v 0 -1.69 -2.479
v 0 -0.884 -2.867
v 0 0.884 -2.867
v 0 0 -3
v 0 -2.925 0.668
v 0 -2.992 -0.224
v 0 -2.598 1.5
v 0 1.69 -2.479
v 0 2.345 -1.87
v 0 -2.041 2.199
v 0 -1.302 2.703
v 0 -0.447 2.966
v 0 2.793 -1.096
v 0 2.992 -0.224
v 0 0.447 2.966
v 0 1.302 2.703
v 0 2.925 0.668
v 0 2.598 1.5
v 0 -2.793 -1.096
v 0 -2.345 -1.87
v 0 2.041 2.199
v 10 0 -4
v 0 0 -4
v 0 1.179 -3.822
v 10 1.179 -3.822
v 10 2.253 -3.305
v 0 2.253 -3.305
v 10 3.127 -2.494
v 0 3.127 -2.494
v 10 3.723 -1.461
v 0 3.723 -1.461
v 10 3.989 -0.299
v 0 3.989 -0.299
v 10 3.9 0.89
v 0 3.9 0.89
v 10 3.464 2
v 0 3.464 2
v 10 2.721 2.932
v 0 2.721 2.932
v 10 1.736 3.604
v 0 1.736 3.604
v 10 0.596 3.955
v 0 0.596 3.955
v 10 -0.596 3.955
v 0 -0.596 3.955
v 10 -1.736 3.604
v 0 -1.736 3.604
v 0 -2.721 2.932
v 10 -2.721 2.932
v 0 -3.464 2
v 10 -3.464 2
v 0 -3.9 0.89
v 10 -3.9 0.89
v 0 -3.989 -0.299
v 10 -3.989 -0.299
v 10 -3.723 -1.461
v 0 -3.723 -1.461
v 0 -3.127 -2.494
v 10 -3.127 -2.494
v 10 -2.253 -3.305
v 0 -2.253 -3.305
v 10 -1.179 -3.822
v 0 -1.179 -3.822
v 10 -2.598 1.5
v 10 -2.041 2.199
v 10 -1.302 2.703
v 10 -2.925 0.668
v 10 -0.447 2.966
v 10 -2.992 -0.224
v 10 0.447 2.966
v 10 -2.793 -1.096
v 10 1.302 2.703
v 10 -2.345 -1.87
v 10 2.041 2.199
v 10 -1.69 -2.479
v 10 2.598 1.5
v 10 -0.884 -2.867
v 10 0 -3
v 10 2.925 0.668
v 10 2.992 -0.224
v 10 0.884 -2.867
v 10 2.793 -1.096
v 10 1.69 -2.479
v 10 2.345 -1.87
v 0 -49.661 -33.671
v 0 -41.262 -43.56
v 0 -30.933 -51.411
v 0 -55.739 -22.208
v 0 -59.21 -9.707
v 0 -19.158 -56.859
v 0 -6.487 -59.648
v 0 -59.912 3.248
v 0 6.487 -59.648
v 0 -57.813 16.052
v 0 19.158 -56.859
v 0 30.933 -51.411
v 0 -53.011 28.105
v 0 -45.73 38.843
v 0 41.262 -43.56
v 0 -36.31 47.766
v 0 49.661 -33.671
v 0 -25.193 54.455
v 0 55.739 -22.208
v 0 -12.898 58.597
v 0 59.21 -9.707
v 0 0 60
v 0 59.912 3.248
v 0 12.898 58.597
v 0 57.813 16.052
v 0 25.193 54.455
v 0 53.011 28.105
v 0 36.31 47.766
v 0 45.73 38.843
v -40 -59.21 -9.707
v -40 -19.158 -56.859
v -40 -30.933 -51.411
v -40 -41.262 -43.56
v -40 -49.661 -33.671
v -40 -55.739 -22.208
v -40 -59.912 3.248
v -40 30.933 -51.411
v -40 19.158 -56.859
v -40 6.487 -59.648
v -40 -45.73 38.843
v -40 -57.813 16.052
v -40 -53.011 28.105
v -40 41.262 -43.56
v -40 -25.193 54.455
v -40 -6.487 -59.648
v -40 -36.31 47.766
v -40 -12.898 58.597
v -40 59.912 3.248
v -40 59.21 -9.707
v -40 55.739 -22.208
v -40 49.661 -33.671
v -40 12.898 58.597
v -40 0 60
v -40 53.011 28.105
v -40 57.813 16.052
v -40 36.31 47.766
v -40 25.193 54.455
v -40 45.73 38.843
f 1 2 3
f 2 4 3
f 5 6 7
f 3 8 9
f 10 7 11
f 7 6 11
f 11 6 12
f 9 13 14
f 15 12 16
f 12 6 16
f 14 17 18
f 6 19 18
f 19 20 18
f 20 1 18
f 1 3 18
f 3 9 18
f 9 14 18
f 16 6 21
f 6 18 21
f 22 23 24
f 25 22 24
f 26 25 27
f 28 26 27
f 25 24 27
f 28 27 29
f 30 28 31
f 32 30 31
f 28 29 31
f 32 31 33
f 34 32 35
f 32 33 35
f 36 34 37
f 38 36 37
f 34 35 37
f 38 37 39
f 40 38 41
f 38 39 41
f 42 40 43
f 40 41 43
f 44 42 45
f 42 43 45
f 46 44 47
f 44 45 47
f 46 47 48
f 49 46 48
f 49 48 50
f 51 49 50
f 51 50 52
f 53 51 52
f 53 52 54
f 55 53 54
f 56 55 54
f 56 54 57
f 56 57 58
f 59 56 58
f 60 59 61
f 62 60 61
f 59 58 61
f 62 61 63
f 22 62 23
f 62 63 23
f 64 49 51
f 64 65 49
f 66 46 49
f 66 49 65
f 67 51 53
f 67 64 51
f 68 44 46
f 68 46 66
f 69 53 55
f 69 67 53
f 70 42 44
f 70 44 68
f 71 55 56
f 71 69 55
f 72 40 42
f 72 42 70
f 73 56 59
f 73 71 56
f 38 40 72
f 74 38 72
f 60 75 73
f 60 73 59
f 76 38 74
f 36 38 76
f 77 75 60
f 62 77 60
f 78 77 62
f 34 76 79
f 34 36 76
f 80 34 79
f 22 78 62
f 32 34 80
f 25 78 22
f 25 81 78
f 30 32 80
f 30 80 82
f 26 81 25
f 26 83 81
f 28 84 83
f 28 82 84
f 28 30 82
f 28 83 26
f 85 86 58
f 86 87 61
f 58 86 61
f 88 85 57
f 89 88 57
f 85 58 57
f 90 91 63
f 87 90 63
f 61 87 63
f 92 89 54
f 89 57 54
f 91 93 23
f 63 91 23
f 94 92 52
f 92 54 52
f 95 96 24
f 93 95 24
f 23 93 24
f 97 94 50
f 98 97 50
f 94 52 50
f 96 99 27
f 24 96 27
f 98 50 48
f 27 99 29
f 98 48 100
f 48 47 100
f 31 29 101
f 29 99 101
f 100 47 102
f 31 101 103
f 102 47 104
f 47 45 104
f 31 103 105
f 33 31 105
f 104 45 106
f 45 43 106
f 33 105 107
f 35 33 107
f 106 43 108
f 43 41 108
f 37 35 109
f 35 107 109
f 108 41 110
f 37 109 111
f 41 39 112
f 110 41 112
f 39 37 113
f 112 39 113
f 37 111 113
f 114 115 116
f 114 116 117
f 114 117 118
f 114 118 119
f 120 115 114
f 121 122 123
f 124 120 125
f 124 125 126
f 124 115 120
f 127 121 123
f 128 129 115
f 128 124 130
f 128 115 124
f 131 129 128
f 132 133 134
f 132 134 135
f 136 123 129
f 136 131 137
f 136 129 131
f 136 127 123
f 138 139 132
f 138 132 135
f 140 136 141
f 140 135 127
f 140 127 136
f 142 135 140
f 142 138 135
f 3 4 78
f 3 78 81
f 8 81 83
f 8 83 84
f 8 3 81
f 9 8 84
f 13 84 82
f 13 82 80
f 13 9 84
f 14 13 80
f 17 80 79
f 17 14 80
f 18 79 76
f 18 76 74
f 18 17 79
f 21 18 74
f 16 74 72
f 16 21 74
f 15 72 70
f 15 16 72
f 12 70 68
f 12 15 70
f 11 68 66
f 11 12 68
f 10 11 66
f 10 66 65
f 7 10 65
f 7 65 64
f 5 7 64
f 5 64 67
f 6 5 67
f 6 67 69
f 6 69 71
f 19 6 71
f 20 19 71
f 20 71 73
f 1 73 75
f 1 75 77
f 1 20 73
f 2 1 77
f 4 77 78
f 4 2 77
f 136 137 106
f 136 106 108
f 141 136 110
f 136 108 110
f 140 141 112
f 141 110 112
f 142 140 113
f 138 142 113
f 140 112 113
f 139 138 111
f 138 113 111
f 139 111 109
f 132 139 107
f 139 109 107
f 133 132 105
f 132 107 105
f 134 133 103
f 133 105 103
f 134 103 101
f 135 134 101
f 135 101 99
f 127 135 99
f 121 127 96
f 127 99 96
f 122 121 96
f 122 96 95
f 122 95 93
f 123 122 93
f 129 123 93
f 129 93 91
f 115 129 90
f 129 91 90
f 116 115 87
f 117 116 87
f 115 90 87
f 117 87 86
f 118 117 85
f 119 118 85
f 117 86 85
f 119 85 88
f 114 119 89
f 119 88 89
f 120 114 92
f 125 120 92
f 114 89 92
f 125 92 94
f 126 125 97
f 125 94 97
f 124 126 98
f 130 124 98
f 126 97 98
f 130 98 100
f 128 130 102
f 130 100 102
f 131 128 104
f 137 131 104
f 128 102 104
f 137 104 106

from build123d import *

# Parameters (mm, degrees)
SKETCH_1_R      = 4
SKETCH_1_R_2    = 3
EXTRUDE_1_DEPTH = 10
SKETCH_2_R      = 60
EXTRUDE_2_DEPTH = 40


with BuildPart() as part:
    # 草图1 → 凸台-拉伸1 (new body)
    with BuildSketch(Plane(origin=(0, 0, 0), x_dir=(0, 0, -1), z_dir=(1, 0, 0))):
        Circle(SKETCH_1_R)
        Circle(SKETCH_1_R_2, mode=Mode.SUBTRACT)
    extrude(amount=EXTRUDE_1_DEPTH)

    # 草图2 → 凸台-拉伸2 (add)
    with BuildSketch(Plane.ZY):
        Circle(SKETCH_2_R)
    extrude(amount=EXTRUDE_2_DEPTH)


solid = part.part
